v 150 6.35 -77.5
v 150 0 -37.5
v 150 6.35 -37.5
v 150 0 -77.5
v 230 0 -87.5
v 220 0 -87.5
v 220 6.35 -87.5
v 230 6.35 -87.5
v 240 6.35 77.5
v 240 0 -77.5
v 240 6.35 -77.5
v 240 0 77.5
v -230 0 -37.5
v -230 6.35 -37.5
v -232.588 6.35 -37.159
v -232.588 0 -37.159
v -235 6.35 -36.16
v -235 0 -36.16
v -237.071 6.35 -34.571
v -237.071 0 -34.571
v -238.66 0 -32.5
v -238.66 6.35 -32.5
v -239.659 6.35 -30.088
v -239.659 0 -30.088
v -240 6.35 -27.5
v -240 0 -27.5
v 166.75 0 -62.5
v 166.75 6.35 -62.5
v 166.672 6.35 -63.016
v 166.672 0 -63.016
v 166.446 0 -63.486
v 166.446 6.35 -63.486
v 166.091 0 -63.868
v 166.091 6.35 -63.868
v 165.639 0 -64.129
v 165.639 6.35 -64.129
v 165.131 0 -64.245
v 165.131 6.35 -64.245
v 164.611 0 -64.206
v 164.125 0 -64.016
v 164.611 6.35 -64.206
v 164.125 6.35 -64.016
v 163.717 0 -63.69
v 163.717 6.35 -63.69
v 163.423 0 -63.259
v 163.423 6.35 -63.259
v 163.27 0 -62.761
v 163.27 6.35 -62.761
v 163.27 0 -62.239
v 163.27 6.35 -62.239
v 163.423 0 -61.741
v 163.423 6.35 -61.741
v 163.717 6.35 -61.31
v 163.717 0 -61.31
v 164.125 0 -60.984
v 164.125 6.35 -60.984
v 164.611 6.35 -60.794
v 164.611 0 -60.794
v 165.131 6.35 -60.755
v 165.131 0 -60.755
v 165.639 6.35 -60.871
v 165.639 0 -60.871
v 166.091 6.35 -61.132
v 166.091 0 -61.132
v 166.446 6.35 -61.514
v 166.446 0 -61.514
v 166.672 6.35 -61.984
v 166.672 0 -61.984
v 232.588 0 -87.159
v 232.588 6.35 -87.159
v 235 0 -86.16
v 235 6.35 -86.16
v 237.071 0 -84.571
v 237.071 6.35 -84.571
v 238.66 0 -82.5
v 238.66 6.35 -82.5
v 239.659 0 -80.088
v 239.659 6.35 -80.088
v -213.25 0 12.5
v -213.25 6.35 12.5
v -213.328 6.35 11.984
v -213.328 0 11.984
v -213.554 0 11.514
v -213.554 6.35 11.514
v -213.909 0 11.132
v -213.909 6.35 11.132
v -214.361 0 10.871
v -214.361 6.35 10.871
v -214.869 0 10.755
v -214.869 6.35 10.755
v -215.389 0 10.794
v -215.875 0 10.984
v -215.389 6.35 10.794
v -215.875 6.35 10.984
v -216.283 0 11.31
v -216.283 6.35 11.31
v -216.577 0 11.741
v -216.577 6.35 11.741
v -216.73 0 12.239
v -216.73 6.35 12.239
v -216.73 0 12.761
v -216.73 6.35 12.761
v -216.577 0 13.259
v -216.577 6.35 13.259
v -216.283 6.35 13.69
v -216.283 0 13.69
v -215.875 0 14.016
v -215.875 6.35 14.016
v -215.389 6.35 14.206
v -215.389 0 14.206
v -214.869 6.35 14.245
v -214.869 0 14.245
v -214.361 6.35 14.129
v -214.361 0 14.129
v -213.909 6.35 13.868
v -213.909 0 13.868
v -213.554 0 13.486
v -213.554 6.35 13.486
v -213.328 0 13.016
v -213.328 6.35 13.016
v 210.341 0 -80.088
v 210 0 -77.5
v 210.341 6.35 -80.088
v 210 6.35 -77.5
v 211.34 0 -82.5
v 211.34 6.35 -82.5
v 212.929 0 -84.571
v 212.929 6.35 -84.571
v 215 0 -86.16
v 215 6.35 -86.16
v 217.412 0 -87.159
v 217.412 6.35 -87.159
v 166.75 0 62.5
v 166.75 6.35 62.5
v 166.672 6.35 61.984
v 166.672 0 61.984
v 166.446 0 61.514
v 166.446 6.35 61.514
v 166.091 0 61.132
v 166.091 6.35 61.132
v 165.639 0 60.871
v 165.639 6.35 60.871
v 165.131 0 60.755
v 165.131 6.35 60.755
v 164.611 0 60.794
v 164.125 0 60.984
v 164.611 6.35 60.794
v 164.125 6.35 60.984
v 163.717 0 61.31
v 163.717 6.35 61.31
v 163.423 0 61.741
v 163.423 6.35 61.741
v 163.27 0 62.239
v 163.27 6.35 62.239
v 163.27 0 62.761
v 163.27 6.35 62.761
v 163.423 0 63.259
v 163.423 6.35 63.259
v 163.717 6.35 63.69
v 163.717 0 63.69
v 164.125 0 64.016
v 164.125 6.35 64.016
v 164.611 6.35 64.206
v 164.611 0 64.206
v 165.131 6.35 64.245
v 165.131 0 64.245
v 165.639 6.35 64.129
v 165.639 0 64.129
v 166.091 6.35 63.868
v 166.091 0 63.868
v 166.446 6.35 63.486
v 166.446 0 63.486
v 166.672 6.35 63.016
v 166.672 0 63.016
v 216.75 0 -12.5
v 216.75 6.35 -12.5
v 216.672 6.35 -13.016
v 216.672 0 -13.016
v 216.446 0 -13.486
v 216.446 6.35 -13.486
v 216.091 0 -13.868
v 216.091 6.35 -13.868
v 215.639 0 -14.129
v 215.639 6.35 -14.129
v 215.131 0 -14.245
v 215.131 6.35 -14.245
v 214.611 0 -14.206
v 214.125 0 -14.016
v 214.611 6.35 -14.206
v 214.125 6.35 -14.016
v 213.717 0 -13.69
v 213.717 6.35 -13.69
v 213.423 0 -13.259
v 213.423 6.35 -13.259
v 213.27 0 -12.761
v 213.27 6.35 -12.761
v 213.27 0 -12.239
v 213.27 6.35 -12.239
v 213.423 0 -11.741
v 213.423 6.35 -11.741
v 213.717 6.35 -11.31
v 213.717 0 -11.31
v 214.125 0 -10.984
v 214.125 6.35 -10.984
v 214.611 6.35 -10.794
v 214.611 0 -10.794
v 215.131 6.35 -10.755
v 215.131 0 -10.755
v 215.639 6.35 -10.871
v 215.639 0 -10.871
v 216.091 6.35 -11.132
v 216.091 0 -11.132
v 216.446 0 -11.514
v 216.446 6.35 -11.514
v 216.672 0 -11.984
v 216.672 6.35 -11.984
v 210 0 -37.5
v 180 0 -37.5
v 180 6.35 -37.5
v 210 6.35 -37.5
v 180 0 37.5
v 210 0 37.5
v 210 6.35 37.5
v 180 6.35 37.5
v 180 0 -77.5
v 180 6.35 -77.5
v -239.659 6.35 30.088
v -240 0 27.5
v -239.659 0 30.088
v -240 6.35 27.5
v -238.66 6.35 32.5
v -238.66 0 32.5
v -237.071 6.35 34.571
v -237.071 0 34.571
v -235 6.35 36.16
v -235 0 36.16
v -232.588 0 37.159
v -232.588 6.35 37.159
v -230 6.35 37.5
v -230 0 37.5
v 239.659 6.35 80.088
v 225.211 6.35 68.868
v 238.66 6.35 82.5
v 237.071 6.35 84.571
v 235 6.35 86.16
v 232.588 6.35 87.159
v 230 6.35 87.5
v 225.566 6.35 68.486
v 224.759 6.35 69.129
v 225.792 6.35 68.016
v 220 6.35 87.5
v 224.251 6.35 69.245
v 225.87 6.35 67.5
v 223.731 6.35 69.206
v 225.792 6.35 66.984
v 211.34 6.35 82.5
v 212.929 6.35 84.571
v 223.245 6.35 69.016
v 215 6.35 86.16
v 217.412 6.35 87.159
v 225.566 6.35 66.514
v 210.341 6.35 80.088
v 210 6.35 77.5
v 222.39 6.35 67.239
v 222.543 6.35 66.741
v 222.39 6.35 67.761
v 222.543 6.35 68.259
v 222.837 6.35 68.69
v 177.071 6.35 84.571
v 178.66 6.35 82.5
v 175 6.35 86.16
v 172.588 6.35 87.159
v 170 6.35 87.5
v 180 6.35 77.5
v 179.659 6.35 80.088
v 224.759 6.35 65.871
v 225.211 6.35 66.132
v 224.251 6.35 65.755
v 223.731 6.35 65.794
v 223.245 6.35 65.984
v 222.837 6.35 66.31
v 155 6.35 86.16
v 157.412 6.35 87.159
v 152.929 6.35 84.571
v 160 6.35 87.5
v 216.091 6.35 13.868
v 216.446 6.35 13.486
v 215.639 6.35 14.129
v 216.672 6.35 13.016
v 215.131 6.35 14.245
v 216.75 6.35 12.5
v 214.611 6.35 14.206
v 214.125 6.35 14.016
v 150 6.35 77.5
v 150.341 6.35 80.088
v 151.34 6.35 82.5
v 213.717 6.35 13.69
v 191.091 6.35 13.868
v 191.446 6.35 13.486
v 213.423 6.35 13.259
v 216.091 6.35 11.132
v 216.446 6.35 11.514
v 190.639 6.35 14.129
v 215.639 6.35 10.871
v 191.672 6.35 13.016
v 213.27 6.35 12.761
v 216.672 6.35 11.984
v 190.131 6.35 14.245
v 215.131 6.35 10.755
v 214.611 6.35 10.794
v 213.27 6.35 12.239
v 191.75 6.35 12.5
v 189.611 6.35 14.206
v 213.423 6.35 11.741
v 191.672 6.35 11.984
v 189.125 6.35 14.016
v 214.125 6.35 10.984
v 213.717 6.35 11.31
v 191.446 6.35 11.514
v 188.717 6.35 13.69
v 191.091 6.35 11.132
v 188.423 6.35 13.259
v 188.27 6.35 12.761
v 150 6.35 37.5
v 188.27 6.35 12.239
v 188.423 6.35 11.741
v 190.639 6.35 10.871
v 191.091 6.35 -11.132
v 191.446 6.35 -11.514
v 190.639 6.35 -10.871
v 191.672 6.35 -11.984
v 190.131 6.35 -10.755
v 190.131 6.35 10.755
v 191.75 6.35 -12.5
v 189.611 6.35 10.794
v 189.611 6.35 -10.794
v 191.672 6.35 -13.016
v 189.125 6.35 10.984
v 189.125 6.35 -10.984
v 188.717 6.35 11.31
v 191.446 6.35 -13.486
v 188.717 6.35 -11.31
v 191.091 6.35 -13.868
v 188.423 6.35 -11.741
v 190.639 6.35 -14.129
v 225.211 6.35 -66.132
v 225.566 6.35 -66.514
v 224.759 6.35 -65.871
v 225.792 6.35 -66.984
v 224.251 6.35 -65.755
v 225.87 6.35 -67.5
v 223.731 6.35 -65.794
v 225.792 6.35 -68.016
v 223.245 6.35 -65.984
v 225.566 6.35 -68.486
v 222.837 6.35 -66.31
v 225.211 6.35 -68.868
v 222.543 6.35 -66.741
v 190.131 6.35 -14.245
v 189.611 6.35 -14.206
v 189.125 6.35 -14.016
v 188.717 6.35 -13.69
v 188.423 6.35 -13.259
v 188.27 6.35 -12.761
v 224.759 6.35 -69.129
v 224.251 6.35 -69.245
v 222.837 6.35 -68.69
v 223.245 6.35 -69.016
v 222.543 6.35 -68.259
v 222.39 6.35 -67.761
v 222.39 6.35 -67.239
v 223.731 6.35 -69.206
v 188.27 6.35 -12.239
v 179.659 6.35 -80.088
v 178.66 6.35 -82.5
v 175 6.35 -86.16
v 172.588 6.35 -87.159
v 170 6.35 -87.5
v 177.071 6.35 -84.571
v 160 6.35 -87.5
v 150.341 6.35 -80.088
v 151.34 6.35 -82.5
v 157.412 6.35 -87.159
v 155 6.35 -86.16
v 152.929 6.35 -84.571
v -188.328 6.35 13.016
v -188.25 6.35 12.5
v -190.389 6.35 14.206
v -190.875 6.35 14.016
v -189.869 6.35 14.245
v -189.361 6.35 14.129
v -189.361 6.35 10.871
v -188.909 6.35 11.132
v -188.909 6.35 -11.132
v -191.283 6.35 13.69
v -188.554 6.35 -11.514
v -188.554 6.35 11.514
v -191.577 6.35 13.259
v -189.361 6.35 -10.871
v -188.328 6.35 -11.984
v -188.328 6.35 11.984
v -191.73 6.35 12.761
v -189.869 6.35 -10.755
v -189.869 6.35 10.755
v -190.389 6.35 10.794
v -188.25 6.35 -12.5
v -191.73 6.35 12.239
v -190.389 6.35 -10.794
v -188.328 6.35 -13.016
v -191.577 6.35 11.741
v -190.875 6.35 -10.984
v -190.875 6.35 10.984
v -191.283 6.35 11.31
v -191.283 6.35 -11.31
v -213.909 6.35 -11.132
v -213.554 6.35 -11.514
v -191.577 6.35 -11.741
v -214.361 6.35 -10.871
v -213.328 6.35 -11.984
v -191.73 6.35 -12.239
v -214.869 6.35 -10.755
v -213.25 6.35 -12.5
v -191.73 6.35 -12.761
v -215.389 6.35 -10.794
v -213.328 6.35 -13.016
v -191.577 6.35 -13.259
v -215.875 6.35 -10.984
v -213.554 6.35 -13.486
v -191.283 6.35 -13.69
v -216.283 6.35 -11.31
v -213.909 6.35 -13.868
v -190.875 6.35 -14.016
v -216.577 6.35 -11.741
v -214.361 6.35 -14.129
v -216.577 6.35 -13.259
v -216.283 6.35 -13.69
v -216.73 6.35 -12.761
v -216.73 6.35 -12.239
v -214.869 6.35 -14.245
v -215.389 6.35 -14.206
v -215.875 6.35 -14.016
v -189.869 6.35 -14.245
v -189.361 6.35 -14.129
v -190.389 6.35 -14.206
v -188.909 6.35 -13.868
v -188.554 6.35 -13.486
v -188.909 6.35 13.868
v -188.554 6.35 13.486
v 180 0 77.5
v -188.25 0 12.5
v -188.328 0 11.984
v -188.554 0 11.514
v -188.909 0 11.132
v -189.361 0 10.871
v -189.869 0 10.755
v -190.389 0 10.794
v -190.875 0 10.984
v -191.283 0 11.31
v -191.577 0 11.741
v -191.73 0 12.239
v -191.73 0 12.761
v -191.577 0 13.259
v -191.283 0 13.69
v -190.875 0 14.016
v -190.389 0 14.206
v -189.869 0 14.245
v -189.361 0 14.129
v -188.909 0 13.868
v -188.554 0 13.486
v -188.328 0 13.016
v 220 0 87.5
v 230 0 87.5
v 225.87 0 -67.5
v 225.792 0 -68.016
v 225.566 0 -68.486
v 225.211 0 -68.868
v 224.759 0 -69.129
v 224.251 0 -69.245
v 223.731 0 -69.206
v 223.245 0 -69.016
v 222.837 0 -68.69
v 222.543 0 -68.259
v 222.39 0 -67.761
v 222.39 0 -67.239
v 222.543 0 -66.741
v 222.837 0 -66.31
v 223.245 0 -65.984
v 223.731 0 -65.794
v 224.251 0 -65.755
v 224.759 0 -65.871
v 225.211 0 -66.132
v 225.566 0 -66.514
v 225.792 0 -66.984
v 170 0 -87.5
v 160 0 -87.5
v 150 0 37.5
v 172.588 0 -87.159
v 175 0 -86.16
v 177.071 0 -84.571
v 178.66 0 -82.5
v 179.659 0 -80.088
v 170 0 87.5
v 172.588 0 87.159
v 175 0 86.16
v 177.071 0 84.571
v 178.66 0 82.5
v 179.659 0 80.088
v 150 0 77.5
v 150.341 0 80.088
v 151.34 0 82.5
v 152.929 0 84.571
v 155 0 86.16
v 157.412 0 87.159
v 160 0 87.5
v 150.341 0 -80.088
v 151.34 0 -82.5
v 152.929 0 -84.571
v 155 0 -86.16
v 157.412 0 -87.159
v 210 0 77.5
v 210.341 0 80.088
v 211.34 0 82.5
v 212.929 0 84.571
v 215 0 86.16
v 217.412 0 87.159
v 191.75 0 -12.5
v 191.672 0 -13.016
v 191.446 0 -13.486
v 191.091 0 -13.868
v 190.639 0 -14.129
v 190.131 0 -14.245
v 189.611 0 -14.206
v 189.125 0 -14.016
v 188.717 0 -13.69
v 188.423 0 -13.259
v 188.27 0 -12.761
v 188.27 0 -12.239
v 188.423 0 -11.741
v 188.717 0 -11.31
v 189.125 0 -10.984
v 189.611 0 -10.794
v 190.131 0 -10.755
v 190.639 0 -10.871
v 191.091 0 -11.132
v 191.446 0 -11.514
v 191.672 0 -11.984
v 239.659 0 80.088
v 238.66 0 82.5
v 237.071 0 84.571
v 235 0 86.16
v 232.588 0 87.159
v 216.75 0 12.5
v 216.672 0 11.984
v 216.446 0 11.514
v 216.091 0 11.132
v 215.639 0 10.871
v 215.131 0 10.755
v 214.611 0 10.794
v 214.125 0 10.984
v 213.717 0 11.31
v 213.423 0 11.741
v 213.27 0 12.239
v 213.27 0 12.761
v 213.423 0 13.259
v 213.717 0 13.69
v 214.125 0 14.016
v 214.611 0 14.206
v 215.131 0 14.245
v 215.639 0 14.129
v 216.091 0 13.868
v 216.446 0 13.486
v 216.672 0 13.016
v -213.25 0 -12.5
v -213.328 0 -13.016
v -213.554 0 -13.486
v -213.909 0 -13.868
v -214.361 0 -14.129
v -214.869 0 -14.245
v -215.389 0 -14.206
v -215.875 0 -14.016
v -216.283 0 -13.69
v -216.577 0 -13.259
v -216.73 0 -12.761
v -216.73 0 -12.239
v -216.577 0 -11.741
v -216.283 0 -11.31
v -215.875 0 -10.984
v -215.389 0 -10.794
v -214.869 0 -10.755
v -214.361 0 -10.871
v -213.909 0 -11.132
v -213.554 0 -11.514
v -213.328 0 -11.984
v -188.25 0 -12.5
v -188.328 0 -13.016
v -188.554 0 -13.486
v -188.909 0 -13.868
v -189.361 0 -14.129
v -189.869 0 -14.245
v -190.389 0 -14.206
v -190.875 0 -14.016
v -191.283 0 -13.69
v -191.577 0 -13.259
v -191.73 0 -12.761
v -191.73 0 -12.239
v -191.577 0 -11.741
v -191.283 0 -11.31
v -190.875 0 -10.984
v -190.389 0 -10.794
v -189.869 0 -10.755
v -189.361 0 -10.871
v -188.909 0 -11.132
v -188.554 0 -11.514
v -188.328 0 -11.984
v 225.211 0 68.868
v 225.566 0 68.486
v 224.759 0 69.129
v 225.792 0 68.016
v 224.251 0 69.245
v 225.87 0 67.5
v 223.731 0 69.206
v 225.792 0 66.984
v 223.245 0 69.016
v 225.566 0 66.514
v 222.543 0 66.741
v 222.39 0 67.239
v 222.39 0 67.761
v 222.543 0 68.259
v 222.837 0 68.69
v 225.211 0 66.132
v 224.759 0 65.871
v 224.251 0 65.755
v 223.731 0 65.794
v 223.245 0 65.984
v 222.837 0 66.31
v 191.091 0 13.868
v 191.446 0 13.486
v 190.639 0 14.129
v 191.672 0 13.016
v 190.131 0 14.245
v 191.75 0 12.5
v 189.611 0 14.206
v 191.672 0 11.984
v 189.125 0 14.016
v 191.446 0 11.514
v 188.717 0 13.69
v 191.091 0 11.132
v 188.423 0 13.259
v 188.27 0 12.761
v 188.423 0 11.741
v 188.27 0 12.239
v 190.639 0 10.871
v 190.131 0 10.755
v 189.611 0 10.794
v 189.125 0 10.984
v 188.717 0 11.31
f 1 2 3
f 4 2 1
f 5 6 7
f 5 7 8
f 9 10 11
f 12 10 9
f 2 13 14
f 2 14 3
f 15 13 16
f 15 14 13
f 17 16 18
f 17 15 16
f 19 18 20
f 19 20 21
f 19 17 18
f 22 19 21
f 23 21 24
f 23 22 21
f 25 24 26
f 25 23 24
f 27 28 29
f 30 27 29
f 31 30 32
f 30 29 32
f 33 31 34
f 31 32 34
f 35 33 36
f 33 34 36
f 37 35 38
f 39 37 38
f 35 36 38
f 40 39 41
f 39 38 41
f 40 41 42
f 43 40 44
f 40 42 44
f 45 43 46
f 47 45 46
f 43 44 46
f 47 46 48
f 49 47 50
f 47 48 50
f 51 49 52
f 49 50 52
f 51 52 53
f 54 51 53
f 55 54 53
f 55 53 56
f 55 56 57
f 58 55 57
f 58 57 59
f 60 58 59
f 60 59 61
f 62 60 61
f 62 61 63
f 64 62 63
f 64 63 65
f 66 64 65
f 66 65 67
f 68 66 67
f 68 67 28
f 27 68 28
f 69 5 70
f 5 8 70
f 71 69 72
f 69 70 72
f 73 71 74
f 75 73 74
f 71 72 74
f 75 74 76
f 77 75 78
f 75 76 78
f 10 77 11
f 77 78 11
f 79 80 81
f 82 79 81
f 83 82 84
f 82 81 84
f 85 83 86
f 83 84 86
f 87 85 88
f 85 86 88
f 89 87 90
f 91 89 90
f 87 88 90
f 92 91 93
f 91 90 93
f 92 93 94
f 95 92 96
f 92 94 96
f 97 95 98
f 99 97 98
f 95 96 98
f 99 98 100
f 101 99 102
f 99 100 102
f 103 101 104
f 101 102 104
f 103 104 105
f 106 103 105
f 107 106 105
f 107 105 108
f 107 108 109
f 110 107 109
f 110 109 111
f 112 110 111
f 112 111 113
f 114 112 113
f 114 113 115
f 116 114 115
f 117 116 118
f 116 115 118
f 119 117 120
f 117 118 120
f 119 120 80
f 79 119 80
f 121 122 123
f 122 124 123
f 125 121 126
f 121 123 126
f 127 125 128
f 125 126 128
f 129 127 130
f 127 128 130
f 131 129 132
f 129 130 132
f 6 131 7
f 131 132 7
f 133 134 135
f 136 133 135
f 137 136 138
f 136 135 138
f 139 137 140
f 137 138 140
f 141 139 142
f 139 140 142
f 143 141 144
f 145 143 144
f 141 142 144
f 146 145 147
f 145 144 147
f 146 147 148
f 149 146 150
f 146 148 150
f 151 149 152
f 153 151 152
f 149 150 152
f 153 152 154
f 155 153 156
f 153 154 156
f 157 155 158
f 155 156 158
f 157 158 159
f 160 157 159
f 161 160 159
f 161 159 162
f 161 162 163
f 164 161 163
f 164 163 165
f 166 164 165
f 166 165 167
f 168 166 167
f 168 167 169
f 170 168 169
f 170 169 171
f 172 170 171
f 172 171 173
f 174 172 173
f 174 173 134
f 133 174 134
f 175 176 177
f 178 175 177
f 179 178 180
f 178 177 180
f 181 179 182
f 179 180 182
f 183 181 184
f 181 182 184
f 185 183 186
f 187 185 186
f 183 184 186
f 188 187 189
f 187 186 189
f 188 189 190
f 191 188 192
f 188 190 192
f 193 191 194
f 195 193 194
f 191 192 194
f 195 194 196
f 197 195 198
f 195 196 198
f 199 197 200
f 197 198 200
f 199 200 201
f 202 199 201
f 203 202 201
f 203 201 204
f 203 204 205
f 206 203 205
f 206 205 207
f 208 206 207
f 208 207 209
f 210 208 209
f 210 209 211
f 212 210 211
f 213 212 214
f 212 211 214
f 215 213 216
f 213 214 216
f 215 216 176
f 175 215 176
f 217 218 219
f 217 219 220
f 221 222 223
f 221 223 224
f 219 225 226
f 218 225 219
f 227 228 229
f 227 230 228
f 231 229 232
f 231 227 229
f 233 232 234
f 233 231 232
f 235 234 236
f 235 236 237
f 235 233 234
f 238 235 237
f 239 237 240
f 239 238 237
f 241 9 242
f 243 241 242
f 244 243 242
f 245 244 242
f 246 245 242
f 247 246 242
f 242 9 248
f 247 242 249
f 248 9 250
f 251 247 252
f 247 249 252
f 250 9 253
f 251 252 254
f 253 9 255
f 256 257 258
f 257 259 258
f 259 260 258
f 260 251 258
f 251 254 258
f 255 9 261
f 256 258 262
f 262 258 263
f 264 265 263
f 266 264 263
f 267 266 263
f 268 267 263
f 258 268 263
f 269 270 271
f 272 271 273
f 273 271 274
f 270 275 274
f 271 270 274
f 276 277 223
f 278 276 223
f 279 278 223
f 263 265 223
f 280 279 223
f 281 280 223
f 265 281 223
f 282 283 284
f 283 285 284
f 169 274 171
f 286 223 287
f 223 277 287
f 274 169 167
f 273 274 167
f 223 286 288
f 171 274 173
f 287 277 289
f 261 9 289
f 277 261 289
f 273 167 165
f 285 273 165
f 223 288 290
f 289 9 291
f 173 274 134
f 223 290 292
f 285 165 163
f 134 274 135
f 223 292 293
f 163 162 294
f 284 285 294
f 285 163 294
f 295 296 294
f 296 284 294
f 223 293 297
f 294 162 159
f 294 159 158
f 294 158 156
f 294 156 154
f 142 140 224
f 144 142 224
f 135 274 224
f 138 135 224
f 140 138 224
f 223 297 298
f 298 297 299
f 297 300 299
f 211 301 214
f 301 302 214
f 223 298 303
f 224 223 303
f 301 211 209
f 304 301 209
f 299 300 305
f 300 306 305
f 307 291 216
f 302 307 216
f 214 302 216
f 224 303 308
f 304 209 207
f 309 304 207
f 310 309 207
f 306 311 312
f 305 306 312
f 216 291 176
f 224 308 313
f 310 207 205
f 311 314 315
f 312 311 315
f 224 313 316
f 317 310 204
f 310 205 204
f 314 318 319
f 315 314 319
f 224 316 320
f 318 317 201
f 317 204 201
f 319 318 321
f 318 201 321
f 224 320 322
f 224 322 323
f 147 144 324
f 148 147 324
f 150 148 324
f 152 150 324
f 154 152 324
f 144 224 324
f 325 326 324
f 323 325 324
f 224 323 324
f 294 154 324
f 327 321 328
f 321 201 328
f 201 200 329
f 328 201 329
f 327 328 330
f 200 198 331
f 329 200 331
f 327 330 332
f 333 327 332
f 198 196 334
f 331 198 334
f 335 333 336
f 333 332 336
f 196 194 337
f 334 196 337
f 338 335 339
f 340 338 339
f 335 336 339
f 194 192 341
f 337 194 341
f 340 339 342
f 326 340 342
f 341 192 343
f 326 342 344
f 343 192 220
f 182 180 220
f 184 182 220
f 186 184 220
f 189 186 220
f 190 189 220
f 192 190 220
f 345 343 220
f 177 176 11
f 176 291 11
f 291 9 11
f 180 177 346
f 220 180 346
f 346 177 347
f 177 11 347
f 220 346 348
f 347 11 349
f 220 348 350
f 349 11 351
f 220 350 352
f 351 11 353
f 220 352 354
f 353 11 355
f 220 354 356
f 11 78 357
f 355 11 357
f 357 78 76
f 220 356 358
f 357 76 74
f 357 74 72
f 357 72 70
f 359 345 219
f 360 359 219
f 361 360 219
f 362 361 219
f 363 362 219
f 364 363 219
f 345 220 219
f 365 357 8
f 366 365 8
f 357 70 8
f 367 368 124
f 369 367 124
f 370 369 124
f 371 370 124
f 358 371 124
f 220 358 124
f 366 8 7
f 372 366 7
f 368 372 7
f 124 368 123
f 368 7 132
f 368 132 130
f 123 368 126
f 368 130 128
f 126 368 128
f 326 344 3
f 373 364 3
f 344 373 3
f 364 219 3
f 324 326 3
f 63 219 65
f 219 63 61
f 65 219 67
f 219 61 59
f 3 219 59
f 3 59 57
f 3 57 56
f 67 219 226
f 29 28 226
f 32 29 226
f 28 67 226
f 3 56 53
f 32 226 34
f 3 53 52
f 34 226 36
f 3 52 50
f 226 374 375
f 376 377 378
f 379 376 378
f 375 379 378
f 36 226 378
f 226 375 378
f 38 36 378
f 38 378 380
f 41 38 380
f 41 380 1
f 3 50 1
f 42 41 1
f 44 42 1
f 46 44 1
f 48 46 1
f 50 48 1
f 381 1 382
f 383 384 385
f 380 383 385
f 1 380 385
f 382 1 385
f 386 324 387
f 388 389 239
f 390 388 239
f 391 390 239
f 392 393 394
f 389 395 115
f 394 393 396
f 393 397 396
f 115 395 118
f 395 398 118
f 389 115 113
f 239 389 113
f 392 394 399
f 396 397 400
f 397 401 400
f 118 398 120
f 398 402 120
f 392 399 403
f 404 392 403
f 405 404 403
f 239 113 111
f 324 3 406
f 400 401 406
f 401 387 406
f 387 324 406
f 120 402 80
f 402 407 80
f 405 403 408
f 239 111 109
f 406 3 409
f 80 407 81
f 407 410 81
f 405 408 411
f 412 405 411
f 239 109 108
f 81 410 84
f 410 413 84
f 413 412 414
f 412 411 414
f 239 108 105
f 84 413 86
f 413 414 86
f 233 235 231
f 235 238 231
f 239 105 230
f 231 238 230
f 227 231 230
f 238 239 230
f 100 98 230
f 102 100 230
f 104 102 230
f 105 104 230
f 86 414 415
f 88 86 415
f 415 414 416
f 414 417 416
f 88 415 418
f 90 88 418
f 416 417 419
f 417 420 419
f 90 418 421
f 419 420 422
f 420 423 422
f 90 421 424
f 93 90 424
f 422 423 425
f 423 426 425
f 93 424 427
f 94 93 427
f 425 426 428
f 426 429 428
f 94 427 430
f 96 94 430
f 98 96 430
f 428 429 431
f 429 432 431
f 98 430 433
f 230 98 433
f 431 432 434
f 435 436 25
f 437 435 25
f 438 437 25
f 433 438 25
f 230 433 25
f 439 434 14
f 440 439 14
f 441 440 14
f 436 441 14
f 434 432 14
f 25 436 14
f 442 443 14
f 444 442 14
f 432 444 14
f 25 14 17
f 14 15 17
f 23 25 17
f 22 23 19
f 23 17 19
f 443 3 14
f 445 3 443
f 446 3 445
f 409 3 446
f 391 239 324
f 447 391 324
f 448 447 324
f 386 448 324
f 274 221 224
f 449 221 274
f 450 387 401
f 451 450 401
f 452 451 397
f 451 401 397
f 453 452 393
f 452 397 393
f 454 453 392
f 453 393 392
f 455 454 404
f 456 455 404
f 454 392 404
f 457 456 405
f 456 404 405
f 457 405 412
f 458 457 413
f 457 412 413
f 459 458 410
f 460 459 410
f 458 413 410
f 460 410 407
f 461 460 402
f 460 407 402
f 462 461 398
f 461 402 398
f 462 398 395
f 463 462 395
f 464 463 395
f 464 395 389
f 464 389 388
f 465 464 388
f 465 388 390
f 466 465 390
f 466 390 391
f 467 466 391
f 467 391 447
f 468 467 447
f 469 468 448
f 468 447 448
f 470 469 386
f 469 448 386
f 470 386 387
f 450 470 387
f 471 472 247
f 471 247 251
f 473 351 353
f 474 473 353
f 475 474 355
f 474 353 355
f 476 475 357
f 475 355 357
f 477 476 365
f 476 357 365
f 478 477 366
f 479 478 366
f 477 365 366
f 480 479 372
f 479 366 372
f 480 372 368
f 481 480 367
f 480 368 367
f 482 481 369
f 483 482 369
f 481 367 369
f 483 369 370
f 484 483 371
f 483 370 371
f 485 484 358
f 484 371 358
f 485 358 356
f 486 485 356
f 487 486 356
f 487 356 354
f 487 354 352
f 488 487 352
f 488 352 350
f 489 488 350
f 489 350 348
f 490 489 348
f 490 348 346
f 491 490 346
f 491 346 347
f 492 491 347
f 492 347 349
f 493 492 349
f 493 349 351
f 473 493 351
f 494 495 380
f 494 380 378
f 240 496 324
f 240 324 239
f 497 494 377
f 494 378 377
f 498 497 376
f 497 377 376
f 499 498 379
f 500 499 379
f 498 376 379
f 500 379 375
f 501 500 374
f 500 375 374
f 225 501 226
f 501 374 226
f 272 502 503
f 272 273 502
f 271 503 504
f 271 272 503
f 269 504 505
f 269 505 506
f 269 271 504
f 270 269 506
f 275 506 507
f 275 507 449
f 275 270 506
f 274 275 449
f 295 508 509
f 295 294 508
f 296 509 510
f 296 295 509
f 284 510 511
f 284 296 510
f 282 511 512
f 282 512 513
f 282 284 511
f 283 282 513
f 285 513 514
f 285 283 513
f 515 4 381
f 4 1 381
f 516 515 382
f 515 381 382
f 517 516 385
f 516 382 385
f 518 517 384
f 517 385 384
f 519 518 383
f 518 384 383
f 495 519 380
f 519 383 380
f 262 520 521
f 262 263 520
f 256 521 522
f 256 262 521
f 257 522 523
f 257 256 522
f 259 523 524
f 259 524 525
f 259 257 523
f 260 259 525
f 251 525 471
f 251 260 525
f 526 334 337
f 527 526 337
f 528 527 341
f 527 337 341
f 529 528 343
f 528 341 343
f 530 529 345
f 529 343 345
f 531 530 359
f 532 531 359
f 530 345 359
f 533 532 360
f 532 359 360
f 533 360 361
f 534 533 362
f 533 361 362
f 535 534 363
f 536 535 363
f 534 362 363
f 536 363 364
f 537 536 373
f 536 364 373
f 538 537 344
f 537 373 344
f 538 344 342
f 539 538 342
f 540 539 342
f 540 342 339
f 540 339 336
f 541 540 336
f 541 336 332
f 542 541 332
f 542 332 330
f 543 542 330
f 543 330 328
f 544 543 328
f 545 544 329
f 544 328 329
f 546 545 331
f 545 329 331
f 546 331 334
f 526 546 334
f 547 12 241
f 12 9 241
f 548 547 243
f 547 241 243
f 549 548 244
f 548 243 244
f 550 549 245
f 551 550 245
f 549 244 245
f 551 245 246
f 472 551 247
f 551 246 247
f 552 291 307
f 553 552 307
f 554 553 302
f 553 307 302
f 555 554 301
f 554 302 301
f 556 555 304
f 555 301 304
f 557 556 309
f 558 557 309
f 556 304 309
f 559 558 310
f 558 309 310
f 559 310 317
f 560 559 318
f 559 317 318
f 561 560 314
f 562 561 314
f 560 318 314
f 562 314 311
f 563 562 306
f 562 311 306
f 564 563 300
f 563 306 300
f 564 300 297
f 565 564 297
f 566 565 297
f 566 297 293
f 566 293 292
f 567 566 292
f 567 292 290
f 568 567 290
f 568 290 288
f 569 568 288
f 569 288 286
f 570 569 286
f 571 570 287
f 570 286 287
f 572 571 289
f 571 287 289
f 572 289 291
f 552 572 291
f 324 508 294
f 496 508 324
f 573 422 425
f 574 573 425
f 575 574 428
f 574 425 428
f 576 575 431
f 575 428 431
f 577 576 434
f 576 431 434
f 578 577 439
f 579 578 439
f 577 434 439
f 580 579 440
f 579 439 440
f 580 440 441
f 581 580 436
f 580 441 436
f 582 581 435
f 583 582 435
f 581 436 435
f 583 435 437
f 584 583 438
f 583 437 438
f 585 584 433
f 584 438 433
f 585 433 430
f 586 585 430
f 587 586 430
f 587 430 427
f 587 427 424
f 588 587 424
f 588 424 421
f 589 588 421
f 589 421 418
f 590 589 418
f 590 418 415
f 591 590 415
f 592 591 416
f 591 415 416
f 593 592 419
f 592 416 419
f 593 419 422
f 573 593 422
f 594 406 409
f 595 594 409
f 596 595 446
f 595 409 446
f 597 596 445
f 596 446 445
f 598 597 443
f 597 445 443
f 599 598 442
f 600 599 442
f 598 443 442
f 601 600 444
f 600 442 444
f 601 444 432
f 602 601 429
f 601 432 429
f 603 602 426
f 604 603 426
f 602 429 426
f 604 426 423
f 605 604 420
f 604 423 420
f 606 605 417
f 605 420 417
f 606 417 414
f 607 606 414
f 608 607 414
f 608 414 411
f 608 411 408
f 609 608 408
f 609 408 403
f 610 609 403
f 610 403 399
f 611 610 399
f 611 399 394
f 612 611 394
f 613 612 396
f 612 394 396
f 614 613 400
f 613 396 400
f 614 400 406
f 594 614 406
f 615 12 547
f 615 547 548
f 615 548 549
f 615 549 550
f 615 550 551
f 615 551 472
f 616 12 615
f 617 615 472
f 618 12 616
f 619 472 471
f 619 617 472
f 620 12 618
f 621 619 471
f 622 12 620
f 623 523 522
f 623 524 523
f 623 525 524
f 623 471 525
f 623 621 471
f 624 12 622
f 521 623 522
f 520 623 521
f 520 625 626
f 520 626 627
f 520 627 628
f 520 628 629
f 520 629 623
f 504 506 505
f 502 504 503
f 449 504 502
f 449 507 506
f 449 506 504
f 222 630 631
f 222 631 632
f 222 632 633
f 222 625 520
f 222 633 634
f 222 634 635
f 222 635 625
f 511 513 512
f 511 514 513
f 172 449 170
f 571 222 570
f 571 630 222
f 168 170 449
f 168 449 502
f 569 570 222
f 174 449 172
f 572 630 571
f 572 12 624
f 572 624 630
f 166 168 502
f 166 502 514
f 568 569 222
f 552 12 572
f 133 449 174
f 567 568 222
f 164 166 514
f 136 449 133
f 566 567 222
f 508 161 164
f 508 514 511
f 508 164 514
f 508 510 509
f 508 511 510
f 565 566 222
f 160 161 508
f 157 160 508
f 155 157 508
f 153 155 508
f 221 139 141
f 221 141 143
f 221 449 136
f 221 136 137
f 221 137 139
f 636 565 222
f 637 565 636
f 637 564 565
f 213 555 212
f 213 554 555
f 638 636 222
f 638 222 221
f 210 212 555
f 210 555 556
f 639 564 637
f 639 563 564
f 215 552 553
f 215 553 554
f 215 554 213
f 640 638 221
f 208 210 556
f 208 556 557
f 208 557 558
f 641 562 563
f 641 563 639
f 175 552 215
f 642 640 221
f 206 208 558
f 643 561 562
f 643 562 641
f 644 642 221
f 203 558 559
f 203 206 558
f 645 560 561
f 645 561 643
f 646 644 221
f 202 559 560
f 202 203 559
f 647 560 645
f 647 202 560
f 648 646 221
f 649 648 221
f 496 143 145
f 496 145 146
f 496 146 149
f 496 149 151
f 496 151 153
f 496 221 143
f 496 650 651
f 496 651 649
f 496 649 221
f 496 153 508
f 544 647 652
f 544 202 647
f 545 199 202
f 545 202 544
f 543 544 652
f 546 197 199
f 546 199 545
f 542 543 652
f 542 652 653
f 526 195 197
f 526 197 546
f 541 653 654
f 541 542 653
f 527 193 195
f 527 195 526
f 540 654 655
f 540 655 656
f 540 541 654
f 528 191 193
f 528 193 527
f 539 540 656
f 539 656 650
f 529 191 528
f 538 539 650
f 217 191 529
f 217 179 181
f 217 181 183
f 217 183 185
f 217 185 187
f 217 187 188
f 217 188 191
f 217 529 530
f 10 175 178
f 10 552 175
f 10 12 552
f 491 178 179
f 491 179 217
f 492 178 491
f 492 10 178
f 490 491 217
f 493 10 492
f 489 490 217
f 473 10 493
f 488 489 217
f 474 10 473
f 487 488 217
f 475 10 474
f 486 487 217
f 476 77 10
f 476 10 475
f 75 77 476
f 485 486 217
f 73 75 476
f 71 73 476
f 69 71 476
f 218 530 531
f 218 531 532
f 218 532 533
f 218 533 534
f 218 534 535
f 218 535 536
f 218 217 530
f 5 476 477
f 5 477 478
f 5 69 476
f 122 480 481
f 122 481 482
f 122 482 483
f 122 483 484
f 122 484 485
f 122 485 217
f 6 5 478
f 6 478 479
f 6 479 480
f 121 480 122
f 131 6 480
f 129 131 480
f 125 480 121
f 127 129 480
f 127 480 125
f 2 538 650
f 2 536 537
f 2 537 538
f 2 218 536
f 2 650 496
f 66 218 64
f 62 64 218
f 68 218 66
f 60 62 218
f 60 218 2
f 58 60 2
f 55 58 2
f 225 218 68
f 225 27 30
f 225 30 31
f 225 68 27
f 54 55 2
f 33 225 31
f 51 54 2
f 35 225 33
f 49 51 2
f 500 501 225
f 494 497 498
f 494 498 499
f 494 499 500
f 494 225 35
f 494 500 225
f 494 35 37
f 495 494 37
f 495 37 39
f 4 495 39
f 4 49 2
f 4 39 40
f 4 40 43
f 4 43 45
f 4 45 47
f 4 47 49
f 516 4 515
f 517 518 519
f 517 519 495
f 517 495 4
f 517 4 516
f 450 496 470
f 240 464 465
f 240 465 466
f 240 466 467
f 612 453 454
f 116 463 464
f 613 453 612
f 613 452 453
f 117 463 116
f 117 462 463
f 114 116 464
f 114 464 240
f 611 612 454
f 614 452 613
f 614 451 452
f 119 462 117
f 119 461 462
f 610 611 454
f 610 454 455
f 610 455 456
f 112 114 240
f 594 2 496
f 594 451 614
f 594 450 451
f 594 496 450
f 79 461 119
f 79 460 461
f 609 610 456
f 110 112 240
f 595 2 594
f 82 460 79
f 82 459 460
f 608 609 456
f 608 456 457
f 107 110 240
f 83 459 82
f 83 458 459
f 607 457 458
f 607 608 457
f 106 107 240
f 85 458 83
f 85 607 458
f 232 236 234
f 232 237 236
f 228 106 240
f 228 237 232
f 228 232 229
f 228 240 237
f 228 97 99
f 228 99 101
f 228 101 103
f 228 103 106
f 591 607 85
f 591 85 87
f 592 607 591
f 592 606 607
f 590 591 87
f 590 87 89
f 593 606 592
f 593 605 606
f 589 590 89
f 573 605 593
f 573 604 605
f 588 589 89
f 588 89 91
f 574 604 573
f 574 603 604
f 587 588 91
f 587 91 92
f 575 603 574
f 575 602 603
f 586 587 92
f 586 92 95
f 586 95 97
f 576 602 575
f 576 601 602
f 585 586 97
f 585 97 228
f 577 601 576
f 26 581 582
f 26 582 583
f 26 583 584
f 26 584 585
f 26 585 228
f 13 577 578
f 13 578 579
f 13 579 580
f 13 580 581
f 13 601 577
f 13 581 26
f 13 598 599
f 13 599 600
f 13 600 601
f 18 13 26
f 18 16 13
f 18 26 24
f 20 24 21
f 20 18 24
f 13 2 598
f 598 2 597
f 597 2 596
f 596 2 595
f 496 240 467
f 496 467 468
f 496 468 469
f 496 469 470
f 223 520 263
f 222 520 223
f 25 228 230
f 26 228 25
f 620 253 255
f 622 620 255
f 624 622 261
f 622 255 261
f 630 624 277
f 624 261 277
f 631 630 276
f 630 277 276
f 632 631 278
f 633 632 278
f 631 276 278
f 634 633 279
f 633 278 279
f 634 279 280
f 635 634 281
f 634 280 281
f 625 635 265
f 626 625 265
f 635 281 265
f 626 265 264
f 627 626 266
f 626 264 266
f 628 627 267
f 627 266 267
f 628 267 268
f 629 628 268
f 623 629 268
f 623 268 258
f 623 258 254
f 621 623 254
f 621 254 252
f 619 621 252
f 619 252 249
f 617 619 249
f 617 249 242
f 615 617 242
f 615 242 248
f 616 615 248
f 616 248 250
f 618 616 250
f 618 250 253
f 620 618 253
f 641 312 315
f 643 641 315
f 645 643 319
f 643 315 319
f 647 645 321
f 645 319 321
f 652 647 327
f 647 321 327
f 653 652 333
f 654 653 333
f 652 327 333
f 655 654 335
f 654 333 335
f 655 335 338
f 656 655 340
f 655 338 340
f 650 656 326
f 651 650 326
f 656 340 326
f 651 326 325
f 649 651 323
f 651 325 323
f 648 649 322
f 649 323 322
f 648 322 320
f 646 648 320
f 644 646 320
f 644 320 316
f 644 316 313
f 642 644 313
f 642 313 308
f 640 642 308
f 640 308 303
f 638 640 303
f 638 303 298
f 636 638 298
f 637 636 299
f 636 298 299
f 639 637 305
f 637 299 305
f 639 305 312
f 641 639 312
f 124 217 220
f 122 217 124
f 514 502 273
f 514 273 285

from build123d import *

# Parameters (mm, degrees)
BOSS_EXTRUDE2_DEPTH       = 6.35
SKETCH2_R                 = 1.75
CUT_EXTRUDE1_DEPTH        = 6.35
LPATTERN1_COUNT           = 2
LPATTERN1_PITCH           = 25
LPATTERN2_COUNT           = 2
LPATTERN2_PITCH           = 25
LPATTERN2_COPY_1_SKETCH_R = 1.75
LPATTERN2_COPY_1_DEPTH    = 6.35
FILLET1_R                 = 10
SKETCH3_R                 = 1.75
CUT_EXTRUDE2_DEPTH        = 7.35
SKETCH5_R                 = 1.75
CUT_EXTRUDE3_DEPTH        = 7.35
LPATTERN3_COUNT           = 2
LPATTERN3_PITCH           = 405
LPATTERN3_COPY_1_SKETCH_R = 1.75
LPATTERN3_COPY_1_DEPTH    = 6.35
LPATTERN3_COPY_2_SKETCH_R = 1.75
LPATTERN3_COPY_2_DEPTH    = 6.35
LPATTERN3_COPY_3_SKETCH_R = 1.75
LPATTERN3_COPY_3_DEPTH    = 6.35


with BuildPart() as part:
    # Sketch1 → Boss-Extrude2 (new body)
    with BuildSketch(Plane(origin=(0, 0, 0), x_dir=(1, 0, 0), z_dir=(0, 1, 0))):
        Polygon((-240, 37.5), (150, 37.5), (150, 87.5), (180, 87.5), (180, 37.5), (210, 37.5), (210, 87.5), (240, 87.5), (240, -87.5), (210, -87.5), (210, -37.5), (180, -37.5), (180, -87.5), (150, -87.5), (150, -37.5), (-240, -37.5), align=None)
    extrude(amount=BOSS_EXTRUDE2_DEPTH)

    # Sketch2 → Cut-Extrude1 (cut)
    with BuildSketch(Plane(origin=(0, 6.35, 0), x_dir=(1, 0, 0), z_dir=(0, 1, 0))):
        with Locations((190, 12.5)):
            Circle(SKETCH2_R)
    cut_extrude1 = extrude(amount=-CUT_EXTRUDE1_DEPTH, mode=Mode.SUBTRACT)

    # LPattern1: Cut-Extrude1 ×2
    with Locations(*[(i * LPATTERN1_PITCH, 0, 0) for i in range(1, LPATTERN1_COUNT)]):
        add(cut_extrude1, mode=Mode.SUBTRACT)

    # LPattern2: Cut-Extrude1 ×2
    with Locations(*[(0, 0, i * LPATTERN2_PITCH) for i in range(1, LPATTERN2_COUNT)]):
        add(cut_extrude1, mode=Mode.SUBTRACT)

    # LPattern2 copy 1 sketch → LPattern2 copy 1 (cut)
    with BuildSketch(Plane(origin=(25, 6.35, 25), x_dir=(1, 0, 0), z_dir=(0, 1, 0))):
        with Locations((190, 12.5)):
            Circle(LPATTERN2_COPY_1_SKETCH_R)
    extrude(amount=-LPATTERN2_COPY_1_DEPTH, mode=Mode.SUBTRACT)

    # Fillet1
    fillet1_edges = [part.edges().sort_by_distance(p)[0] for p in [
        (-240, 3.175, -37.5),
        (150, 3.175, -87.5),
        (180, 3.175, -87.5),
        (210, 3.175, -87.5),
        (240, 3.175, -87.5),
        (240, 3.175, 87.5),
        (210, 3.175, 87.5),
        (180, 3.175, 87.5),
        (150, 3.175, 87.5),
        (-240, 3.175, 37.5),
    ]]
    fillet(fillet1_edges, radius=FILLET1_R)

    # Sketch3 → Cut-Extrude2 (cut, through all)
    with BuildSketch(Plane(origin=(0, 6.35, 0), x_dir=(1, 0, 0), z_dir=(0, 1, 0))):
        with Locations((224.12, 67.5)):
            Circle(SKETCH3_R)
        with Locations((224.12, -67.5)):
            Circle(SKETCH3_R)
    extrude(amount=-CUT_EXTRUDE2_DEPTH, mode=Mode.SUBTRACT)

    # Sketch5 → Cut-Extrude3 (cut, through all)
    with BuildSketch(Plane(origin=(0, 6.35, 0), x_dir=(1, 0, 0), z_dir=(0, 1, 0))):
        with Locations((165, 62.5)):
            Circle(SKETCH5_R)
        with Locations((165, -62.5)):
            Circle(SKETCH5_R)
    extrude(amount=-CUT_EXTRUDE3_DEPTH, mode=Mode.SUBTRACT)

    # LPattern3: Cut-Extrude1 ×2
    with Locations(*[(-i * LPATTERN3_PITCH, 0, 0) for i in range(1, LPATTERN3_COUNT)]):
        add(cut_extrude1, mode=Mode.SUBTRACT)

    # LPattern3 copy 1 sketch → LPattern3 copy 1 (cut)
    with BuildSketch(Plane(origin=(-405, 6.35, 25), x_dir=(1, 0, 0), z_dir=(0, 1, 0))):
        with Locations((190, 12.5)):
            Circle(LPATTERN3_COPY_1_SKETCH_R)
    extrude(amount=-LPATTERN3_COPY_1_DEPTH, mode=Mode.SUBTRACT)

    # LPattern3 copy 2 sketch → LPattern3 copy 2 (cut)
    with BuildSketch(Plane(origin=(-380, 6.35, 25), x_dir=(1, 0, 0), z_dir=(0, 1, 0))):
        with Locations((190, 12.5)):
            Circle(LPATTERN3_COPY_2_SKETCH_R)
    extrude(amount=-LPATTERN3_COPY_2_DEPTH, mode=Mode.SUBTRACT)

    # LPattern3 copy 3 sketch → LPattern3 copy 3 (cut)
    with BuildSketch(Plane(origin=(-380, 6.35, 0), x_dir=(1, 0, 0), z_dir=(0, 1, 0))):
        with Locations((190, 12.5)):
            Circle(LPATTERN3_COPY_3_SKETCH_R)
    extrude(amount=-LPATTERN3_COPY_3_DEPTH, mode=Mode.SUBTRACT)


solid = part.part
